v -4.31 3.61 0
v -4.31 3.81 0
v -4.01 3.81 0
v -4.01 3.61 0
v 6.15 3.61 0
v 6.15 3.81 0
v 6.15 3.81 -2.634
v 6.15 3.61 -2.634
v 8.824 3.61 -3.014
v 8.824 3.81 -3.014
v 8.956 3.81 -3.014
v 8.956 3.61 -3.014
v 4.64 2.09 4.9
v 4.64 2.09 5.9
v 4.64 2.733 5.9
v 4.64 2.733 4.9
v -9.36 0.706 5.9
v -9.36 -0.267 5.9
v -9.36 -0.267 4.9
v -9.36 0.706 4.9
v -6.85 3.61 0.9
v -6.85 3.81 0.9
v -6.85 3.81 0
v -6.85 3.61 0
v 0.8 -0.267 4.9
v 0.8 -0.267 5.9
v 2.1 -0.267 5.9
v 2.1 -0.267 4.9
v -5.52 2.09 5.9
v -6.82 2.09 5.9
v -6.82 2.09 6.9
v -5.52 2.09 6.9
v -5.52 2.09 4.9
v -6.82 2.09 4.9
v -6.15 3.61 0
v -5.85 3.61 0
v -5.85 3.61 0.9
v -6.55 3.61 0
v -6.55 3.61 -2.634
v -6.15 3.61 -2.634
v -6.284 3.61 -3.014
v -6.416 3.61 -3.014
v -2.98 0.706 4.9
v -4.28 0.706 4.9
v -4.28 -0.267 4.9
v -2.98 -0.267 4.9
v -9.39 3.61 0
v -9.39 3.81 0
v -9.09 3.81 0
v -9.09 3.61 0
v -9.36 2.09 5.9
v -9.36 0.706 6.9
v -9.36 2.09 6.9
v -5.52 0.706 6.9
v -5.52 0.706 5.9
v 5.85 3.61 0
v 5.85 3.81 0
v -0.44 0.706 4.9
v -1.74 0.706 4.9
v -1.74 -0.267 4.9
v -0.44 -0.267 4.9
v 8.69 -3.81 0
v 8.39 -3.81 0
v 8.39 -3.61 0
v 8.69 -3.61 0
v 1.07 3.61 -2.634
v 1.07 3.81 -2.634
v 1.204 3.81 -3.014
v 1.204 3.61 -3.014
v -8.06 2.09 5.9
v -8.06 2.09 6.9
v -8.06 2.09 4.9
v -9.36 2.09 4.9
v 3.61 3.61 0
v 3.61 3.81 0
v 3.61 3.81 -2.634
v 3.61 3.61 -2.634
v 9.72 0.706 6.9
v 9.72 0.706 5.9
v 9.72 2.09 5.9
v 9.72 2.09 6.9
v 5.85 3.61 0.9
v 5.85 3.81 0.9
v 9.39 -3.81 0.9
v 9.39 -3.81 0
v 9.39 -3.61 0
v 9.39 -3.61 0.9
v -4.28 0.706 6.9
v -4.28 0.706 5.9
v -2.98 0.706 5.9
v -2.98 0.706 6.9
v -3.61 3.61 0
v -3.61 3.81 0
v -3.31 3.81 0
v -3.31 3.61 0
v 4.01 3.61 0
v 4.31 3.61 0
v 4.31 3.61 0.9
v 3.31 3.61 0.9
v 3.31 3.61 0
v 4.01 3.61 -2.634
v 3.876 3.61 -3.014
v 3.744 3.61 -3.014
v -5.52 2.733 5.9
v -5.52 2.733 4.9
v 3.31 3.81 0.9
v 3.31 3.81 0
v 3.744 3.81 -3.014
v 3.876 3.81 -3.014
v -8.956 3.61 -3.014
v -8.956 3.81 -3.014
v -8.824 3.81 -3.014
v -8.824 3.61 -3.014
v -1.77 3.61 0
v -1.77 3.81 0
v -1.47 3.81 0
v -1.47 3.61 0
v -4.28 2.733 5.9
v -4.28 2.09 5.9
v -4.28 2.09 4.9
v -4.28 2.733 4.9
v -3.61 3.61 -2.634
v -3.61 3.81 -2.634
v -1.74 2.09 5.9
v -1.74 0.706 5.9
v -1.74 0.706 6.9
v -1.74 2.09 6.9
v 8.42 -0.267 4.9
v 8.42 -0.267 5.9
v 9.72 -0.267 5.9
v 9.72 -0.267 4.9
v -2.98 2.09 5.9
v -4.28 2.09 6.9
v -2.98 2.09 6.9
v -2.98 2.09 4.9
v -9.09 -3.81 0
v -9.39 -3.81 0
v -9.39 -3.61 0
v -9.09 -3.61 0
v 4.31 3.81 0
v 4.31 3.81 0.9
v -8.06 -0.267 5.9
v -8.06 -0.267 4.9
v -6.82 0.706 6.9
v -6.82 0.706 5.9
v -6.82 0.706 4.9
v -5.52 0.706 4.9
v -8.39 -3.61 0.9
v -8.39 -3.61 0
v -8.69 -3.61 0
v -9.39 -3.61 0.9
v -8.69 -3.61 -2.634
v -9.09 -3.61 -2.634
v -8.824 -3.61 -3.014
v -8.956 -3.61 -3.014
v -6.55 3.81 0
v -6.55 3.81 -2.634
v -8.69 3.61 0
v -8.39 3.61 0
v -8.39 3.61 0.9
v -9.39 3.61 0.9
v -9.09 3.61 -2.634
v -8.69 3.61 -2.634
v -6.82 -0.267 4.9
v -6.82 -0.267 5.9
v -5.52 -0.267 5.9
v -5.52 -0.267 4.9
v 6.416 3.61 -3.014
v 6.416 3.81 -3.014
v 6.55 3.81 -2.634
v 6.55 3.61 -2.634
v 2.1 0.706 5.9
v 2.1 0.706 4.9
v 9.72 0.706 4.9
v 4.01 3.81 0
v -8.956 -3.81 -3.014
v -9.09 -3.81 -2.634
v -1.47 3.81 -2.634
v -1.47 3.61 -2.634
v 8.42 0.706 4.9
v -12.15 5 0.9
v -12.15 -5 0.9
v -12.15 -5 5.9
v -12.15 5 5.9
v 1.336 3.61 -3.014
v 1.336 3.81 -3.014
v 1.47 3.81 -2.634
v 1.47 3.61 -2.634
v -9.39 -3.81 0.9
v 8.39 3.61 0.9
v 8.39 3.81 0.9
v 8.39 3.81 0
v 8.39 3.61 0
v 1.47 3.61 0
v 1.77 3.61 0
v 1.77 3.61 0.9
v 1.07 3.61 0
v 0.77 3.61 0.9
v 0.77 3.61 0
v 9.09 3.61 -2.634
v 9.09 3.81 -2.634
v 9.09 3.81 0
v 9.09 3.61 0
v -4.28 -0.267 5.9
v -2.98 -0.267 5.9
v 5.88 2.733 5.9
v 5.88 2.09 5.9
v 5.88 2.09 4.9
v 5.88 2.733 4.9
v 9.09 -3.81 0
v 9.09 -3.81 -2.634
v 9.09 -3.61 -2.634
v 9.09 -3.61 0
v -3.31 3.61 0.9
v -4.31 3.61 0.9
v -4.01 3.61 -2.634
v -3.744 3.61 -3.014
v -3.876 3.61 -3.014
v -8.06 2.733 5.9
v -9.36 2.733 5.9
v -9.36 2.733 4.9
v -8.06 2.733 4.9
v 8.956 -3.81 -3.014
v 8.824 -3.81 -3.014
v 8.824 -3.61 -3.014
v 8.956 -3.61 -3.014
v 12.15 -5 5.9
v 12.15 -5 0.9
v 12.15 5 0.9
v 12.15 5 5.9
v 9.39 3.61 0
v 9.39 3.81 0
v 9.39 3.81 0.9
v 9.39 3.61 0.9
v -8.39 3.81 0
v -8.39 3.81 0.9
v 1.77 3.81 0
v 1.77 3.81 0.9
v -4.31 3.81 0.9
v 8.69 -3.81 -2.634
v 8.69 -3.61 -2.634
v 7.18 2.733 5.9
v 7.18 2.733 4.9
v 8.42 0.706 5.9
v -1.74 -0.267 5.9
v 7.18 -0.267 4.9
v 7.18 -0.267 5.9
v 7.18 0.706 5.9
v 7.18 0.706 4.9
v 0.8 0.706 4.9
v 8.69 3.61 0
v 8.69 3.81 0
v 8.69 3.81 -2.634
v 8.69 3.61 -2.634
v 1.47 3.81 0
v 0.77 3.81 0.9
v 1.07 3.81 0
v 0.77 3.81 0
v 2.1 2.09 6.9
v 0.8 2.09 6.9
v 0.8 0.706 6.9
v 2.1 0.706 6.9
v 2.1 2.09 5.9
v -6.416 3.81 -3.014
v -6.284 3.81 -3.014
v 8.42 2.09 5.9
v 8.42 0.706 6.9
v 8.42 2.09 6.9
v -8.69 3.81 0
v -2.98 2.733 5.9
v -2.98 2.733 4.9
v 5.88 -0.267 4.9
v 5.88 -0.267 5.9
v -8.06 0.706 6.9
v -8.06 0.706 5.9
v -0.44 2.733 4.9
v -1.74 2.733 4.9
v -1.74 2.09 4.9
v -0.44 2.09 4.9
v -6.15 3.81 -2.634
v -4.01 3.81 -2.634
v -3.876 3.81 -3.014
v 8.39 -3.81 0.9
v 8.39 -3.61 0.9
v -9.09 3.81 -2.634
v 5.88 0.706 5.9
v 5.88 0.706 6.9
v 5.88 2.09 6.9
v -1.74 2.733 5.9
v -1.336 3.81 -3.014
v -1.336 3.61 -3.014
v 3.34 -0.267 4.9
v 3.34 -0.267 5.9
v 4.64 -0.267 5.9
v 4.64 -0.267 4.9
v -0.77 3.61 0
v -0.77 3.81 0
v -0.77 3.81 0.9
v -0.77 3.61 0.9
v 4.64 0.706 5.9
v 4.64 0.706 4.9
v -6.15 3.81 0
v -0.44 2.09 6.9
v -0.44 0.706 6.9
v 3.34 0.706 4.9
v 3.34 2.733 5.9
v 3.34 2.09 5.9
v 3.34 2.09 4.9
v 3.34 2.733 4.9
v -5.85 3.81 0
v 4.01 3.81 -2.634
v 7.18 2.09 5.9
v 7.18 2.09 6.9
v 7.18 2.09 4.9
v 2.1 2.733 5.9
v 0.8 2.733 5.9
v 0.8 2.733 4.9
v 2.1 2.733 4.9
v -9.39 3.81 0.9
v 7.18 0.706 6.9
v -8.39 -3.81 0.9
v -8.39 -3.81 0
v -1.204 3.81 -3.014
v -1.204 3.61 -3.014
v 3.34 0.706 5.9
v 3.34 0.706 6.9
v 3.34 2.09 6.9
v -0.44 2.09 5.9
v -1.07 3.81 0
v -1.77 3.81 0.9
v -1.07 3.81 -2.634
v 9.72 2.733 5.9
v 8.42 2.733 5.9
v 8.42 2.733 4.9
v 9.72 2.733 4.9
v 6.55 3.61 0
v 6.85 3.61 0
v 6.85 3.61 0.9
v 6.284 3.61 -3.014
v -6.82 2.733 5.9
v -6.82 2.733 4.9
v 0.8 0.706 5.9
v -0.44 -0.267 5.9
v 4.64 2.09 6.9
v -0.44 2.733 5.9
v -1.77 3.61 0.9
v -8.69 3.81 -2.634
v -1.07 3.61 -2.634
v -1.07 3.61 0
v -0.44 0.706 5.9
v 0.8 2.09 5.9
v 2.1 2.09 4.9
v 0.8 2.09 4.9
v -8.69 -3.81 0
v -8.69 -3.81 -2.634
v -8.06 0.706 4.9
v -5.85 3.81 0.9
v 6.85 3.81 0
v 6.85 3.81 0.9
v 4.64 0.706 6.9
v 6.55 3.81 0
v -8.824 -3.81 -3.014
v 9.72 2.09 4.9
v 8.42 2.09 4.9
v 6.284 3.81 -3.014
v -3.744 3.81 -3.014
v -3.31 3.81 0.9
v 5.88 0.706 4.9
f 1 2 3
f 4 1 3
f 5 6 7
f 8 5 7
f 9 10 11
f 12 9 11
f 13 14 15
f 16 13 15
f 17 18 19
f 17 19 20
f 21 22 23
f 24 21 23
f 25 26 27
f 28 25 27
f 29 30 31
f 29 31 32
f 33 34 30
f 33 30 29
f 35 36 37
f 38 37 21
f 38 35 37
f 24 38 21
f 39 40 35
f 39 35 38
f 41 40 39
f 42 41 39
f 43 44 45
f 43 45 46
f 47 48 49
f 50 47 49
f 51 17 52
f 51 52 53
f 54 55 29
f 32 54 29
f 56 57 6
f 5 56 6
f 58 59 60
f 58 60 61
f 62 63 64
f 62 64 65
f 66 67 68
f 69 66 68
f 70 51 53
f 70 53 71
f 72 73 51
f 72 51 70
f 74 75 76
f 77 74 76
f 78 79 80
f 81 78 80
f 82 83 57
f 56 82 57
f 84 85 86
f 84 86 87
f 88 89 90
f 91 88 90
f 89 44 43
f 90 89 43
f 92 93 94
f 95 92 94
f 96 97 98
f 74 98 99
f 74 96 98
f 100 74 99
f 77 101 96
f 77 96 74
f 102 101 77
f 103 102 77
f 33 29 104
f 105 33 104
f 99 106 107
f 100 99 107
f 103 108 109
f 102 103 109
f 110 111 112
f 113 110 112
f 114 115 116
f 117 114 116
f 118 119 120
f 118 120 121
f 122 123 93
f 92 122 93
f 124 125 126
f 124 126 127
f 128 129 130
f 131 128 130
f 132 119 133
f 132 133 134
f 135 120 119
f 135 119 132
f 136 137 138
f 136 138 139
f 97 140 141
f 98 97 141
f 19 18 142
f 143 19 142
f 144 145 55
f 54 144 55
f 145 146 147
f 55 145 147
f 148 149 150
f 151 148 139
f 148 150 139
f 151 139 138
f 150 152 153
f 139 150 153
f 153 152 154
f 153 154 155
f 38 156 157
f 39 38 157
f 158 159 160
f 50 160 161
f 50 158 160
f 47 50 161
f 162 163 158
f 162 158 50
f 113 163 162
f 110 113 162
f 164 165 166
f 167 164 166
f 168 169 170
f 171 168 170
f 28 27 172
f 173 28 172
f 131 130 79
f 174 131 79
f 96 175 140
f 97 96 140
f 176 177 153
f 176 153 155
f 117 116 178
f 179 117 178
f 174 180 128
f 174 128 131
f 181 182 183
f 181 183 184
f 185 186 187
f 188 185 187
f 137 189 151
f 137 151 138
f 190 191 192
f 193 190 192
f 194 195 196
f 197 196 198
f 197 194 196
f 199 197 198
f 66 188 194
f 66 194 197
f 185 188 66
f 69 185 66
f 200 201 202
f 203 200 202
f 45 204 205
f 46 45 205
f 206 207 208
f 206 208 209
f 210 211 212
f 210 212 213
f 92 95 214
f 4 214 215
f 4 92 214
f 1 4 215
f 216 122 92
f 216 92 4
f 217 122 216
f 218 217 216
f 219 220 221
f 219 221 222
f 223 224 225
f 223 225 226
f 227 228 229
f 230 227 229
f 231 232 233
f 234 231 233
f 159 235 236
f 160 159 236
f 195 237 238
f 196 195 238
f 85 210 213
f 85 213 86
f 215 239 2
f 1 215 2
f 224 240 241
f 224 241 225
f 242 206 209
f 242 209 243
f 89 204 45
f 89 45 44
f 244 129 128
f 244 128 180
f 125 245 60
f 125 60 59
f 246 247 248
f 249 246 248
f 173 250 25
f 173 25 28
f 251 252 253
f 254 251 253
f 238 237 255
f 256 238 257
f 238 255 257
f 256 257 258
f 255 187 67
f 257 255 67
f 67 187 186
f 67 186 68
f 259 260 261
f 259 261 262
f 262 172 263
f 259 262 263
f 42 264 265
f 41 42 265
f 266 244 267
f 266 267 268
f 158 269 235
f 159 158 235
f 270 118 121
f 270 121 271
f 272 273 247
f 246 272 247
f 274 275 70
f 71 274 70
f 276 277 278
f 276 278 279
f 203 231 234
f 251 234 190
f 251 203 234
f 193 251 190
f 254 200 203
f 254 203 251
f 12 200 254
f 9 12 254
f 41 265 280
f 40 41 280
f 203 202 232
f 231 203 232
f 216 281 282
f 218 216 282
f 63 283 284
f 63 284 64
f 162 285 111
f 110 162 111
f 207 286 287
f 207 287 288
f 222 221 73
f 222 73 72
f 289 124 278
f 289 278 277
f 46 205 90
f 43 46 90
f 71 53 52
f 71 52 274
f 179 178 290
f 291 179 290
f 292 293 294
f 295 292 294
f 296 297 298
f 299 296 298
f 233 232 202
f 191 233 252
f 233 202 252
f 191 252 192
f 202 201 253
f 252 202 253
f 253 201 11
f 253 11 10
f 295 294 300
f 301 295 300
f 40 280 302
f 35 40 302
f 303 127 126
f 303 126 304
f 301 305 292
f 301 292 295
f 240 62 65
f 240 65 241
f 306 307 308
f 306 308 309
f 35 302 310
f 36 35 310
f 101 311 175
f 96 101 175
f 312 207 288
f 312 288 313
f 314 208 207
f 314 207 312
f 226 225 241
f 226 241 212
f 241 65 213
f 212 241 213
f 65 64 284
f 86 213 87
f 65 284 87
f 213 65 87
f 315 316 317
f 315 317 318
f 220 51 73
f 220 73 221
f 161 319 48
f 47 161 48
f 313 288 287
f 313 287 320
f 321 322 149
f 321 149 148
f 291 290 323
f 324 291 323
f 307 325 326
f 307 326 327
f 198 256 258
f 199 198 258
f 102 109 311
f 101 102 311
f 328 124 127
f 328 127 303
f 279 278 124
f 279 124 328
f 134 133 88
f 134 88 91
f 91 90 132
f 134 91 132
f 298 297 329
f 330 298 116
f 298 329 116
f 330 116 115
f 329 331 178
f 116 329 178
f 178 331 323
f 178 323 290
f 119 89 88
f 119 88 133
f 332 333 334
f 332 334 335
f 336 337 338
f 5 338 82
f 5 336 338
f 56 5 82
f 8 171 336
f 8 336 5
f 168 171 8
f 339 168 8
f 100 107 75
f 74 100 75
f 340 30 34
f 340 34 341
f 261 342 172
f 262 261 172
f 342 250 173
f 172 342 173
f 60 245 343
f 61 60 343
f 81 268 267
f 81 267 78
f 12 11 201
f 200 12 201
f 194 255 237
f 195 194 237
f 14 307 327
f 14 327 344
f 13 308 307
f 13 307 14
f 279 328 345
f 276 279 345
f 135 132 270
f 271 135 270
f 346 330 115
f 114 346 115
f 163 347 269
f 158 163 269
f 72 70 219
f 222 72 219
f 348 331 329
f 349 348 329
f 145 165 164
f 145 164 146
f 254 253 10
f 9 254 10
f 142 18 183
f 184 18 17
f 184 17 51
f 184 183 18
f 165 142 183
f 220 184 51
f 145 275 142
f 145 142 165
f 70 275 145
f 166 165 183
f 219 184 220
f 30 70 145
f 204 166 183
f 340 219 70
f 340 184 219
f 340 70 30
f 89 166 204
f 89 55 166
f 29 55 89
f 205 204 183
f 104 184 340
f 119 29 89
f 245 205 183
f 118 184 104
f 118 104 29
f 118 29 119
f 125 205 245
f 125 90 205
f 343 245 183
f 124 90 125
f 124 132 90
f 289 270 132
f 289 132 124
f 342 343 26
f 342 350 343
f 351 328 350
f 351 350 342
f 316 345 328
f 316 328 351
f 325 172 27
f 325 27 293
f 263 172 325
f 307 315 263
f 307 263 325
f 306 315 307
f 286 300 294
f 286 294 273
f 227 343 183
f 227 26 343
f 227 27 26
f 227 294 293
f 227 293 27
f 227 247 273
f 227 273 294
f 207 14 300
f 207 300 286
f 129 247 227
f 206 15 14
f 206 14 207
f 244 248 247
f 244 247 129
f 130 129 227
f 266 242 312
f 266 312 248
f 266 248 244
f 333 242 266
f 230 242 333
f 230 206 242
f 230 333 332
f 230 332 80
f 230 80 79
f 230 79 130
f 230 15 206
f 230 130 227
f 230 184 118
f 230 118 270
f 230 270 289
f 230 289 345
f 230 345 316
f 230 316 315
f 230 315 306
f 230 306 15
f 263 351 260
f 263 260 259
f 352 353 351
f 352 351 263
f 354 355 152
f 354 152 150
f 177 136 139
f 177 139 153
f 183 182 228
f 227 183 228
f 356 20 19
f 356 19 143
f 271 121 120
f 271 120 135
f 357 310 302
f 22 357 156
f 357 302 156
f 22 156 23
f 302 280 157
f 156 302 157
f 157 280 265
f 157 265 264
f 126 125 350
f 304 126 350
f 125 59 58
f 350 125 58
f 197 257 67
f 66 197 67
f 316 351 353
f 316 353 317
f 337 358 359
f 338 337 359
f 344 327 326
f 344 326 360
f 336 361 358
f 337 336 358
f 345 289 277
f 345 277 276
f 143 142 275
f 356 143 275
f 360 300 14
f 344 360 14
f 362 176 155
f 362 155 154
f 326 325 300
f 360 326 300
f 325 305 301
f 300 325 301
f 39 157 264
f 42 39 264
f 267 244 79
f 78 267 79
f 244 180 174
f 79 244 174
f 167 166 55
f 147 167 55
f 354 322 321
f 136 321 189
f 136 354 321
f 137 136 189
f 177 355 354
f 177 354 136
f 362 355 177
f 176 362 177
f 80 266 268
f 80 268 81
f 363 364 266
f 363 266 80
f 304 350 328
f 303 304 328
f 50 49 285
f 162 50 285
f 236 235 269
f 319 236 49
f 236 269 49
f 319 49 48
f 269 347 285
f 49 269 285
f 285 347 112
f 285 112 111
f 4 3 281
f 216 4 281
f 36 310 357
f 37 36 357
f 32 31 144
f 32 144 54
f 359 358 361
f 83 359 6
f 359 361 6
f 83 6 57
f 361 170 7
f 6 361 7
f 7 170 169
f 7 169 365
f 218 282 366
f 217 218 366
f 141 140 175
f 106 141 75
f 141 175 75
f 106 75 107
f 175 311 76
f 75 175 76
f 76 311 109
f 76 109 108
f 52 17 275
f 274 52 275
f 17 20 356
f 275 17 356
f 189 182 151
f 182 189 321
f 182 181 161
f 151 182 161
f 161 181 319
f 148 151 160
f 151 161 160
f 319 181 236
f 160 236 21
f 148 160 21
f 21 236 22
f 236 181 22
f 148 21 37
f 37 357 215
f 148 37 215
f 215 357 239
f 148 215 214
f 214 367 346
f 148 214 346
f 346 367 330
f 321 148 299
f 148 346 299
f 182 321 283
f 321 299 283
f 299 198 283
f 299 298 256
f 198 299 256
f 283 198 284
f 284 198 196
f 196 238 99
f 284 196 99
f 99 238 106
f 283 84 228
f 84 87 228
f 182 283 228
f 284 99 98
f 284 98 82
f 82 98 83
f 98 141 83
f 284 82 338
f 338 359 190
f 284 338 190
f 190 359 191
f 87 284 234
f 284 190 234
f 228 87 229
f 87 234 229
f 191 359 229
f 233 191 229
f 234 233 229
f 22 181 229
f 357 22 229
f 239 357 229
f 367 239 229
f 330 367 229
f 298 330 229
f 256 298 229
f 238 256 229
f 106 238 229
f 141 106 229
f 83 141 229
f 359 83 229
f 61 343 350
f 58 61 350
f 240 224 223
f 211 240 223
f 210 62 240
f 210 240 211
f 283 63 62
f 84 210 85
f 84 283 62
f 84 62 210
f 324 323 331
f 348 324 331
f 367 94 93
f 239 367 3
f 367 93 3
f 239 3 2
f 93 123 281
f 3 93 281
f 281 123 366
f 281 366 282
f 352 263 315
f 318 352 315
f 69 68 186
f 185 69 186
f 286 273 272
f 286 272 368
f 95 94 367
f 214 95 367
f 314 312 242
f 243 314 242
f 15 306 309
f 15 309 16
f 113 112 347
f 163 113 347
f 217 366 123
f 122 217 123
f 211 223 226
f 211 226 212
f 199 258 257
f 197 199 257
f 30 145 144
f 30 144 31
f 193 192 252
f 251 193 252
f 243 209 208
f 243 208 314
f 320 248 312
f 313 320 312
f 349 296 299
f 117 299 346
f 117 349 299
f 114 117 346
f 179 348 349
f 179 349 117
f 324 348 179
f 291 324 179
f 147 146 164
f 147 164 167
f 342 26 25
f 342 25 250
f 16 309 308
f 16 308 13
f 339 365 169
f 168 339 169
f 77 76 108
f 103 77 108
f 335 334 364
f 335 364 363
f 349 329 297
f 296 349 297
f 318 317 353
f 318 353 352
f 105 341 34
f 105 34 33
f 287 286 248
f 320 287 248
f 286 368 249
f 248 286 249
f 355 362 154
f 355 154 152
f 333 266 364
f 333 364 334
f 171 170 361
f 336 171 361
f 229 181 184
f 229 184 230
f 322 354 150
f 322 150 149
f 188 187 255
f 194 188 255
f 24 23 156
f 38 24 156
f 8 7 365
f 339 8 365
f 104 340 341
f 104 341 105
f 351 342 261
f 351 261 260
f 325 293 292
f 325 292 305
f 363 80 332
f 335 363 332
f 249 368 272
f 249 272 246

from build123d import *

# Parameters (mm, degrees)
SKETCH1_W              = 24.3
SKETCH1_H              = 10
BOSS_EXTRUDE1_DEPTH    = 5
SKETCH2_W              = 1.3
SKETCH2_H              = 3
CUT_EXTRUDE3_DEPTH     = 1
LPATTERN1_COUNT        = 8
LPATTERN1_PITCH        = 2.54
SKETCH3_W              = 1.3
SKETCH3_H              = 1.384019907
BOSS_EXTRUDE2_DEPTH    = 2
LPATTERN2_COUNT        = 8
LPATTERN2_PITCH        = 2.54
BOSS_EXTRUDE3_DEPTH    = 0.2
LPATTERN3_COUNT        = 8
LPATTERN3_PITCH        = 2.54
LPATTERN5_COPY_1_DEPTH = 0.2
LPATTERN5_COPY_2_DEPTH = 0.2


with BuildPart() as part:
    # Sketch1 → Boss-Extrude1 (new body)
    with BuildSketch(Plane.XY):
        Rectangle(SKETCH1_W, SKETCH1_H)
    extrude(amount=BOSS_EXTRUDE1_DEPTH)

    # Sketch2 → Cut-Extrude3 (cut)
    with BuildSketch(Plane.XY.offset(5)):
        with Locations((-8.710298424, 1.233093176)):
            Rectangle(SKETCH2_W, SKETCH2_H)
    cut_extrude3 = extrude(amount=-CUT_EXTRUDE3_DEPTH, mode=Mode.SUBTRACT)

    # LPattern1: Cut-Extrude3 ×8
    with Locations(*[(i * LPATTERN1_PITCH, 0, 0) for i in range(1, LPATTERN1_COUNT)]):
        add(cut_extrude3, mode=Mode.SUBTRACT)

    # Sketch3 → Boss-Extrude2 (add)
    with BuildSketch(Plane.XY.offset(4)):
        with Locations((-8.710298424, 1.39842675)):
            Rectangle(SKETCH3_W, SKETCH3_H)
    boss_extrude2 = extrude(amount=BOSS_EXTRUDE2_DEPTH)

    # LPattern2: Boss-Extrude2 ×8
    with Locations(*[(i * LPATTERN2_PITCH, 0, 0) for i in range(1, LPATTERN2_COUNT)]):
        add(boss_extrude2)


with BuildPart() as part_1:
    # Body-Move/Copy1: moved
    add(part.part.moved(Location((0, 0, 0.9))))

    # Sketch4 → Boss-Extrude3 (add)
    with BuildSketch(Plane(origin=(0, 3.81, 0), x_dir=(1, 0, 0), z_dir=(0, 1, 0))):
        Polygon((-9.39, -0.9), (-9.39, 0), (-9.09, 0), (-9.09, 2.634314575), (-8.955683901, 3.014217874), (-8.824316099, 3.014217874), (-8.69, 2.634314575), (-8.69, 0), (-8.39, 0), (-8.39, -0.9), align=None)
    boss_extrude3 = extrude(amount=-BOSS_EXTRUDE3_DEPTH)

    # LPattern3: Boss-Extrude3 ×8
    with Locations(*[(i * LPATTERN3_PITCH, 0, 0) for i in range(1, LPATTERN3_COUNT)]):
        add(boss_extrude3)

    # Mirror1: Boss-Extrude3 across plane
    add(boss_extrude3.mirror(Plane.ZX))

    # LPattern5 copy 1 sketch → LPattern5 copy 1 (add)
    with BuildSketch(Plane(origin=(17.78, -3.81, 0), x_dir=(1, 0, 0), z_dir=(0, -1, 0))):
        Polygon((-9.39, 0.9), (-9.39, 0), (-9.09, 0), (-9.09, -2.634314575), (-8.955683901, -3.014217874), (-8.824316099, -3.014217874), (-8.69, -2.634314575), (-8.69, 0), (-8.39, 0), (-8.39, 0.9), align=None)
    extrude(amount=-LPATTERN5_COPY_1_DEPTH)

    # LPattern5 copy 2 sketch → LPattern5 copy 2 (add)
    with BuildSketch(Plane(origin=(17.78, 3.81, 0), x_dir=(1, 0, 0), z_dir=(0, 1, 0))):
        Polygon((-9.39, -0.9), (-9.39, 0), (-9.09, 0), (-9.09, 2.634314575), (-8.955683901, 3.014217874), (-8.824316099, 3.014217874), (-8.69, 2.634314575), (-8.69, 0), (-8.39, 0), (-8.39, -0.9), align=None)
    extrude(amount=-LPATTERN5_COPY_2_DEPTH)


solid = part_1.part
